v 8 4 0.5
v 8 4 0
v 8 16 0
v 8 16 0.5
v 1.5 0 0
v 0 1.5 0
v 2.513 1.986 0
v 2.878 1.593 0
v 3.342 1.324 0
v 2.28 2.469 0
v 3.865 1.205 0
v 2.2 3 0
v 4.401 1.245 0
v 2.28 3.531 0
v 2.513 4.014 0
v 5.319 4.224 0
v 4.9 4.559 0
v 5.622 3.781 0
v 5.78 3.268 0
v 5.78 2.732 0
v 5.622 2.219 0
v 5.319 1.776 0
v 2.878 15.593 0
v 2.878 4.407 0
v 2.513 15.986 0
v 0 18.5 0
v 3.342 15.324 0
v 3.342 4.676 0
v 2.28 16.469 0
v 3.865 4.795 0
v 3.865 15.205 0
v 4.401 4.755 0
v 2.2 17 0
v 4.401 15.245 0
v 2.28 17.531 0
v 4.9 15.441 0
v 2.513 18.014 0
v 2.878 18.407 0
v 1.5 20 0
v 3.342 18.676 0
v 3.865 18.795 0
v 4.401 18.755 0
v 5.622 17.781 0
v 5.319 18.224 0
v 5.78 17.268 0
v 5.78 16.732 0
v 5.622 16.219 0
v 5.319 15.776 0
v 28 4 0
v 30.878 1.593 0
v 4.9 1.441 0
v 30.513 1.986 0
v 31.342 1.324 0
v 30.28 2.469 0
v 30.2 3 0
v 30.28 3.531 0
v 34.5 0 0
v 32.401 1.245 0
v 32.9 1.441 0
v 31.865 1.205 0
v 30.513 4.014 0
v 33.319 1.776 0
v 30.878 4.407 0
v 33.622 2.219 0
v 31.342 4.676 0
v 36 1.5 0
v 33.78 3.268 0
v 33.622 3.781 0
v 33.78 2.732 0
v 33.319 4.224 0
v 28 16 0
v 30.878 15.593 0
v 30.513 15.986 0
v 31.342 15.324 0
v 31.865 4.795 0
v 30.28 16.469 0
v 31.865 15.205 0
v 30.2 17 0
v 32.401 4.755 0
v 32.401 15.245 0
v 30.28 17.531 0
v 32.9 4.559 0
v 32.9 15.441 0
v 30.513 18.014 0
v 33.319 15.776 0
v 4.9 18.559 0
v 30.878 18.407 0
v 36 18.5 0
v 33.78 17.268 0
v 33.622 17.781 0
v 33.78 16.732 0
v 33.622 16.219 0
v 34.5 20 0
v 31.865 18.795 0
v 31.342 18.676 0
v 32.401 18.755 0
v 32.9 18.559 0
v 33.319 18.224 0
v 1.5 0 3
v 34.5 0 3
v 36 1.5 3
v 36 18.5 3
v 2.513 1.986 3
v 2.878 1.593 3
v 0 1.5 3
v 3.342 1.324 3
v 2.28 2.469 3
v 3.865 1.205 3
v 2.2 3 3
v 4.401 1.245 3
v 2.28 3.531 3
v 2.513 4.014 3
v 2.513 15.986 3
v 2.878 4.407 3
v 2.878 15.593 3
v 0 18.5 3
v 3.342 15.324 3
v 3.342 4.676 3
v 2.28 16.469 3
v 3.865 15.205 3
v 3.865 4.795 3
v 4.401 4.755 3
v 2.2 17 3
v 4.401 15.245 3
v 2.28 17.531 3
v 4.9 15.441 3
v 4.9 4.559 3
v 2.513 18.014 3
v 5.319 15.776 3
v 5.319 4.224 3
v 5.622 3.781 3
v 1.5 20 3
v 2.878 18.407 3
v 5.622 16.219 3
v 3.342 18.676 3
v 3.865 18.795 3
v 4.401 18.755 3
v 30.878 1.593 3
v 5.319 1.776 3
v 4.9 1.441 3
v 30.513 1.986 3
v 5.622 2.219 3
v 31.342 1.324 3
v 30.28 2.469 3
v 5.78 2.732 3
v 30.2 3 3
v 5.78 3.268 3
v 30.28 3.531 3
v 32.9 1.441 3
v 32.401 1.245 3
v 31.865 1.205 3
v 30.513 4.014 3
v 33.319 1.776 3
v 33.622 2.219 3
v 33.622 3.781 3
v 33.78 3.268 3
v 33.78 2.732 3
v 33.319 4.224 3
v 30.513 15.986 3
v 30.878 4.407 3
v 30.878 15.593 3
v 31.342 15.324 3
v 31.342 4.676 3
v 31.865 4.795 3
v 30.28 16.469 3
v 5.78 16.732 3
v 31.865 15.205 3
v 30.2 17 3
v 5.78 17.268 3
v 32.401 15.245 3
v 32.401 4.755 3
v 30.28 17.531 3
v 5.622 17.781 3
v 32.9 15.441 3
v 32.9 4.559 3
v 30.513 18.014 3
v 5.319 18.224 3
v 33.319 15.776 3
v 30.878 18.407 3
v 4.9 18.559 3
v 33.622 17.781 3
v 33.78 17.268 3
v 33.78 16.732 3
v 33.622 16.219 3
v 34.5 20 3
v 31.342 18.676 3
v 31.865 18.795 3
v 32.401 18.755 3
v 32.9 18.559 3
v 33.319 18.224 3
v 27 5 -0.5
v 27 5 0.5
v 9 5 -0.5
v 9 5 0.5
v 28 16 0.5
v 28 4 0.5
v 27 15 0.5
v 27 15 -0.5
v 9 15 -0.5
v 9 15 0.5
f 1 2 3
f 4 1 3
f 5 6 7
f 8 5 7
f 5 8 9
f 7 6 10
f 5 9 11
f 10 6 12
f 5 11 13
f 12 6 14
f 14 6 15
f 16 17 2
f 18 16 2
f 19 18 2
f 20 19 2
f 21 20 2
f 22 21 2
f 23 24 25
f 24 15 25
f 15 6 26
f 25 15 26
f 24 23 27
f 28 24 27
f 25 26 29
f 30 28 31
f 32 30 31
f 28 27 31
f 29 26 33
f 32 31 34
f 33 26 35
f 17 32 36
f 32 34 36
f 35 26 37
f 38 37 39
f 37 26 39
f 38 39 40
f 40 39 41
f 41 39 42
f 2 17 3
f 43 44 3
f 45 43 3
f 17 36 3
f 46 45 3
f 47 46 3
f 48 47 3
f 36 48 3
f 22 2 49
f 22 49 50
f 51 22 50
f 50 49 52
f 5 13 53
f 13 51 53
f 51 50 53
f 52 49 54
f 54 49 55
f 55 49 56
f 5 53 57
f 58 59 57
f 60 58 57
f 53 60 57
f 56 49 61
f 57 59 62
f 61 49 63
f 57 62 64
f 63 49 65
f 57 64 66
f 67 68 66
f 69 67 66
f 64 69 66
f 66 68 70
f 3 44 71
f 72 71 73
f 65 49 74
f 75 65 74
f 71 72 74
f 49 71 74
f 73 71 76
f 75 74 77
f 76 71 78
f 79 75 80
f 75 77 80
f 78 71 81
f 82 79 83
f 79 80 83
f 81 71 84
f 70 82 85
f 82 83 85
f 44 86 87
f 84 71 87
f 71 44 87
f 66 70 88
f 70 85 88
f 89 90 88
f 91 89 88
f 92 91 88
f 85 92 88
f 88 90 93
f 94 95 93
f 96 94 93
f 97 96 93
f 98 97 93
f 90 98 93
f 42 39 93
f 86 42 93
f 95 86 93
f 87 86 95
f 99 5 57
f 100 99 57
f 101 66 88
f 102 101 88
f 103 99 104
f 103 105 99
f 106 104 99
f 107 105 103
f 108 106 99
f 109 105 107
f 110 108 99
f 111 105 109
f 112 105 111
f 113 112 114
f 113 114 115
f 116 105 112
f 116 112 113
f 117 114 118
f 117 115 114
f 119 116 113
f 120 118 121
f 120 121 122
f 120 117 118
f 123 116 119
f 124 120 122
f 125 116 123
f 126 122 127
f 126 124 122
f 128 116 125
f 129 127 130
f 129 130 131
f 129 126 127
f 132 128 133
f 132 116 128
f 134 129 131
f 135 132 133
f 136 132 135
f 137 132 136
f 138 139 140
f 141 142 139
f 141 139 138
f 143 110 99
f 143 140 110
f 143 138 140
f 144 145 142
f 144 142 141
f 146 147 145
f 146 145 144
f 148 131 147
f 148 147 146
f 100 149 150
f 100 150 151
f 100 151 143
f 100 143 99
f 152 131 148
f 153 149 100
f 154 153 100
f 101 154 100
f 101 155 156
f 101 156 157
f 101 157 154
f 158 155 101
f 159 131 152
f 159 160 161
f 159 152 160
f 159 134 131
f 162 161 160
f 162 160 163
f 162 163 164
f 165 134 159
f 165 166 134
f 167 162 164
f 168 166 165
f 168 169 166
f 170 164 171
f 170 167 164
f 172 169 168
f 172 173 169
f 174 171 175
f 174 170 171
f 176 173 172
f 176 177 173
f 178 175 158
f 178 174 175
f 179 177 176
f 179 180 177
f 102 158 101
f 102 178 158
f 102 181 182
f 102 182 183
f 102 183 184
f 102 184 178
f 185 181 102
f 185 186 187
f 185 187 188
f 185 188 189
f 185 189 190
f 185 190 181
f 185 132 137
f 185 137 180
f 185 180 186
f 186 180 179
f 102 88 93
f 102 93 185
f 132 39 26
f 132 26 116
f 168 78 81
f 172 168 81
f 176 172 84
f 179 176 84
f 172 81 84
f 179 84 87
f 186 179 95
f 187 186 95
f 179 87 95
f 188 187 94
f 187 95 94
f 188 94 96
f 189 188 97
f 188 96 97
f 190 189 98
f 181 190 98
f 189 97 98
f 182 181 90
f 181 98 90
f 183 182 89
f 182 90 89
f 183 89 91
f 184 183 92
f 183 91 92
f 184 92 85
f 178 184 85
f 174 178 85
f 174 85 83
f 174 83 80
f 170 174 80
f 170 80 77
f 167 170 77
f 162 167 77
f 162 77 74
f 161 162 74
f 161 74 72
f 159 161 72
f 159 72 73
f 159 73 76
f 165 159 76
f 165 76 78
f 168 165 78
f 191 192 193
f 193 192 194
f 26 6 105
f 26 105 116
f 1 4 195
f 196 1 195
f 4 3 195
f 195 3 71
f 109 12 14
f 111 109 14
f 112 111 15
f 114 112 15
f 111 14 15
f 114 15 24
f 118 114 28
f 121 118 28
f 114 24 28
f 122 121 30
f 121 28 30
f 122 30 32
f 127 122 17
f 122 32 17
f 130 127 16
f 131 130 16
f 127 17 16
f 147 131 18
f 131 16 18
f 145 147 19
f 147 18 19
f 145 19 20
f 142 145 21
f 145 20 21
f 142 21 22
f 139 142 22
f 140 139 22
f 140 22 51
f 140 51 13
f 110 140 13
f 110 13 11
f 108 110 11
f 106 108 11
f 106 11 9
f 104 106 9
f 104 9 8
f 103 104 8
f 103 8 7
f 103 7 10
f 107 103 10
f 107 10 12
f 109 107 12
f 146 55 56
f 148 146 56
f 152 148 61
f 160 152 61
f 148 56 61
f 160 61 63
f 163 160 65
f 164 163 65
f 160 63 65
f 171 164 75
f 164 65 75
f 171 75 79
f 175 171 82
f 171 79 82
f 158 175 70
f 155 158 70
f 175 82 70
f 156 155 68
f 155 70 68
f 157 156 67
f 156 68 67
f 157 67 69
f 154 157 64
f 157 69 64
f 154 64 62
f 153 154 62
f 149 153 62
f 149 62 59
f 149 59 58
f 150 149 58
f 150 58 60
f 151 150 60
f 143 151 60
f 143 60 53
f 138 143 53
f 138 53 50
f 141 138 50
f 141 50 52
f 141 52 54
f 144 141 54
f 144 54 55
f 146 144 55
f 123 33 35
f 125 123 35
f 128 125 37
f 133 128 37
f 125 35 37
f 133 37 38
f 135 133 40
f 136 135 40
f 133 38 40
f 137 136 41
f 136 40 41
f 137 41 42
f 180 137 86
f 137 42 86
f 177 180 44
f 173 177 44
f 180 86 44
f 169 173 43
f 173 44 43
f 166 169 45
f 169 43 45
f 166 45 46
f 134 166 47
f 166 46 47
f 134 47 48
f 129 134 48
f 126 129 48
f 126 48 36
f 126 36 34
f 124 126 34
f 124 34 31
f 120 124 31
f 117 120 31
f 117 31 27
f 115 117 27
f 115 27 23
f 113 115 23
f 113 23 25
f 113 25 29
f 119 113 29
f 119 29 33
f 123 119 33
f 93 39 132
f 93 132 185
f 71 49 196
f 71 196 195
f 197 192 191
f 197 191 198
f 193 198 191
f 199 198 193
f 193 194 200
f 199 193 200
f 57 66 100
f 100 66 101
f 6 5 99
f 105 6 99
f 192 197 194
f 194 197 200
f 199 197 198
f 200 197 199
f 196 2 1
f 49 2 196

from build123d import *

# Parameters (mm, degrees)
SKETCH1_W                = 36
SKETCH1_H                = 20
BOSS_EXTRUDE1_DEPTH      = 3
M3_CLEARANCE_HOLE1_D     = 3.6
M3_CLEARANCE_HOLE1_DEPTH = 10
M3_CLEARANCE_HOLE1_TIP   = 1.081549114
CHAMFER1_SIZE            = 1.5
SKETCH4_W                = 20
SKETCH4_H                = 12
CUT_EXTRUDE1_DEPTH       = 0.5
SKETCH5_W                = 18
SKETCH5_H                = 10
BOSS_EXTRUDE2_DEPTH      = 1


with BuildPart() as part:
    # Sketch1 → Boss-Extrude1 (new body)
    with BuildSketch(Plane.XY):
        with Locations((18, 10)):
            Rectangle(SKETCH1_W, SKETCH1_H)
    extrude(amount=BOSS_EXTRUDE1_DEPTH)

    # M3 Clearance Hole1
    with Locations(Plane.XY.offset(3)):
        with Locations((4, 17), (32, 17), (32, 3), (4, 3)):
            Hole(M3_CLEARANCE_HOLE1_D / 2, depth=M3_CLEARANCE_HOLE1_DEPTH)
            with Locations((0, 0, -(M3_CLEARANCE_HOLE1_DEPTH + M3_CLEARANCE_HOLE1_TIP / 2))):  # 118° drill point
                Cone(0, M3_CLEARANCE_HOLE1_D / 2, M3_CLEARANCE_HOLE1_TIP, mode=Mode.SUBTRACT)

    # Chamfer1
    chamfer1_edges = [part.edges().sort_by_distance(p)[0] for p in [
        (0, 20, 1.5),
        (36, 20, 1.5),
        (36, 0, 1.5),
        (0, 0, 1.5),
    ]]
    chamfer(chamfer1_edges, length=CHAMFER1_SIZE)

    # Sketch4 → Cut-Extrude1 (cut)
    with BuildSketch(Plane.XY):
        with Locations((18, 10)):
            Rectangle(SKETCH4_W, SKETCH4_H)
    extrude(amount=CUT_EXTRUDE1_DEPTH, mode=Mode.SUBTRACT)


with BuildPart() as body_2:
    # Sketch5 → Boss-Extrude2 (new body)
    with BuildSketch(Plane(origin=(0, 0, 0.5), x_dir=(-1, 0, 0), z_dir=(0, 0, -1))):
        with Locations((-18, 10)):
            Rectangle(SKETCH5_W, SKETCH5_H)
    extrude(amount=BOSS_EXTRUDE2_DEPTH)


solid = Compound([part.part, body_2.part])
